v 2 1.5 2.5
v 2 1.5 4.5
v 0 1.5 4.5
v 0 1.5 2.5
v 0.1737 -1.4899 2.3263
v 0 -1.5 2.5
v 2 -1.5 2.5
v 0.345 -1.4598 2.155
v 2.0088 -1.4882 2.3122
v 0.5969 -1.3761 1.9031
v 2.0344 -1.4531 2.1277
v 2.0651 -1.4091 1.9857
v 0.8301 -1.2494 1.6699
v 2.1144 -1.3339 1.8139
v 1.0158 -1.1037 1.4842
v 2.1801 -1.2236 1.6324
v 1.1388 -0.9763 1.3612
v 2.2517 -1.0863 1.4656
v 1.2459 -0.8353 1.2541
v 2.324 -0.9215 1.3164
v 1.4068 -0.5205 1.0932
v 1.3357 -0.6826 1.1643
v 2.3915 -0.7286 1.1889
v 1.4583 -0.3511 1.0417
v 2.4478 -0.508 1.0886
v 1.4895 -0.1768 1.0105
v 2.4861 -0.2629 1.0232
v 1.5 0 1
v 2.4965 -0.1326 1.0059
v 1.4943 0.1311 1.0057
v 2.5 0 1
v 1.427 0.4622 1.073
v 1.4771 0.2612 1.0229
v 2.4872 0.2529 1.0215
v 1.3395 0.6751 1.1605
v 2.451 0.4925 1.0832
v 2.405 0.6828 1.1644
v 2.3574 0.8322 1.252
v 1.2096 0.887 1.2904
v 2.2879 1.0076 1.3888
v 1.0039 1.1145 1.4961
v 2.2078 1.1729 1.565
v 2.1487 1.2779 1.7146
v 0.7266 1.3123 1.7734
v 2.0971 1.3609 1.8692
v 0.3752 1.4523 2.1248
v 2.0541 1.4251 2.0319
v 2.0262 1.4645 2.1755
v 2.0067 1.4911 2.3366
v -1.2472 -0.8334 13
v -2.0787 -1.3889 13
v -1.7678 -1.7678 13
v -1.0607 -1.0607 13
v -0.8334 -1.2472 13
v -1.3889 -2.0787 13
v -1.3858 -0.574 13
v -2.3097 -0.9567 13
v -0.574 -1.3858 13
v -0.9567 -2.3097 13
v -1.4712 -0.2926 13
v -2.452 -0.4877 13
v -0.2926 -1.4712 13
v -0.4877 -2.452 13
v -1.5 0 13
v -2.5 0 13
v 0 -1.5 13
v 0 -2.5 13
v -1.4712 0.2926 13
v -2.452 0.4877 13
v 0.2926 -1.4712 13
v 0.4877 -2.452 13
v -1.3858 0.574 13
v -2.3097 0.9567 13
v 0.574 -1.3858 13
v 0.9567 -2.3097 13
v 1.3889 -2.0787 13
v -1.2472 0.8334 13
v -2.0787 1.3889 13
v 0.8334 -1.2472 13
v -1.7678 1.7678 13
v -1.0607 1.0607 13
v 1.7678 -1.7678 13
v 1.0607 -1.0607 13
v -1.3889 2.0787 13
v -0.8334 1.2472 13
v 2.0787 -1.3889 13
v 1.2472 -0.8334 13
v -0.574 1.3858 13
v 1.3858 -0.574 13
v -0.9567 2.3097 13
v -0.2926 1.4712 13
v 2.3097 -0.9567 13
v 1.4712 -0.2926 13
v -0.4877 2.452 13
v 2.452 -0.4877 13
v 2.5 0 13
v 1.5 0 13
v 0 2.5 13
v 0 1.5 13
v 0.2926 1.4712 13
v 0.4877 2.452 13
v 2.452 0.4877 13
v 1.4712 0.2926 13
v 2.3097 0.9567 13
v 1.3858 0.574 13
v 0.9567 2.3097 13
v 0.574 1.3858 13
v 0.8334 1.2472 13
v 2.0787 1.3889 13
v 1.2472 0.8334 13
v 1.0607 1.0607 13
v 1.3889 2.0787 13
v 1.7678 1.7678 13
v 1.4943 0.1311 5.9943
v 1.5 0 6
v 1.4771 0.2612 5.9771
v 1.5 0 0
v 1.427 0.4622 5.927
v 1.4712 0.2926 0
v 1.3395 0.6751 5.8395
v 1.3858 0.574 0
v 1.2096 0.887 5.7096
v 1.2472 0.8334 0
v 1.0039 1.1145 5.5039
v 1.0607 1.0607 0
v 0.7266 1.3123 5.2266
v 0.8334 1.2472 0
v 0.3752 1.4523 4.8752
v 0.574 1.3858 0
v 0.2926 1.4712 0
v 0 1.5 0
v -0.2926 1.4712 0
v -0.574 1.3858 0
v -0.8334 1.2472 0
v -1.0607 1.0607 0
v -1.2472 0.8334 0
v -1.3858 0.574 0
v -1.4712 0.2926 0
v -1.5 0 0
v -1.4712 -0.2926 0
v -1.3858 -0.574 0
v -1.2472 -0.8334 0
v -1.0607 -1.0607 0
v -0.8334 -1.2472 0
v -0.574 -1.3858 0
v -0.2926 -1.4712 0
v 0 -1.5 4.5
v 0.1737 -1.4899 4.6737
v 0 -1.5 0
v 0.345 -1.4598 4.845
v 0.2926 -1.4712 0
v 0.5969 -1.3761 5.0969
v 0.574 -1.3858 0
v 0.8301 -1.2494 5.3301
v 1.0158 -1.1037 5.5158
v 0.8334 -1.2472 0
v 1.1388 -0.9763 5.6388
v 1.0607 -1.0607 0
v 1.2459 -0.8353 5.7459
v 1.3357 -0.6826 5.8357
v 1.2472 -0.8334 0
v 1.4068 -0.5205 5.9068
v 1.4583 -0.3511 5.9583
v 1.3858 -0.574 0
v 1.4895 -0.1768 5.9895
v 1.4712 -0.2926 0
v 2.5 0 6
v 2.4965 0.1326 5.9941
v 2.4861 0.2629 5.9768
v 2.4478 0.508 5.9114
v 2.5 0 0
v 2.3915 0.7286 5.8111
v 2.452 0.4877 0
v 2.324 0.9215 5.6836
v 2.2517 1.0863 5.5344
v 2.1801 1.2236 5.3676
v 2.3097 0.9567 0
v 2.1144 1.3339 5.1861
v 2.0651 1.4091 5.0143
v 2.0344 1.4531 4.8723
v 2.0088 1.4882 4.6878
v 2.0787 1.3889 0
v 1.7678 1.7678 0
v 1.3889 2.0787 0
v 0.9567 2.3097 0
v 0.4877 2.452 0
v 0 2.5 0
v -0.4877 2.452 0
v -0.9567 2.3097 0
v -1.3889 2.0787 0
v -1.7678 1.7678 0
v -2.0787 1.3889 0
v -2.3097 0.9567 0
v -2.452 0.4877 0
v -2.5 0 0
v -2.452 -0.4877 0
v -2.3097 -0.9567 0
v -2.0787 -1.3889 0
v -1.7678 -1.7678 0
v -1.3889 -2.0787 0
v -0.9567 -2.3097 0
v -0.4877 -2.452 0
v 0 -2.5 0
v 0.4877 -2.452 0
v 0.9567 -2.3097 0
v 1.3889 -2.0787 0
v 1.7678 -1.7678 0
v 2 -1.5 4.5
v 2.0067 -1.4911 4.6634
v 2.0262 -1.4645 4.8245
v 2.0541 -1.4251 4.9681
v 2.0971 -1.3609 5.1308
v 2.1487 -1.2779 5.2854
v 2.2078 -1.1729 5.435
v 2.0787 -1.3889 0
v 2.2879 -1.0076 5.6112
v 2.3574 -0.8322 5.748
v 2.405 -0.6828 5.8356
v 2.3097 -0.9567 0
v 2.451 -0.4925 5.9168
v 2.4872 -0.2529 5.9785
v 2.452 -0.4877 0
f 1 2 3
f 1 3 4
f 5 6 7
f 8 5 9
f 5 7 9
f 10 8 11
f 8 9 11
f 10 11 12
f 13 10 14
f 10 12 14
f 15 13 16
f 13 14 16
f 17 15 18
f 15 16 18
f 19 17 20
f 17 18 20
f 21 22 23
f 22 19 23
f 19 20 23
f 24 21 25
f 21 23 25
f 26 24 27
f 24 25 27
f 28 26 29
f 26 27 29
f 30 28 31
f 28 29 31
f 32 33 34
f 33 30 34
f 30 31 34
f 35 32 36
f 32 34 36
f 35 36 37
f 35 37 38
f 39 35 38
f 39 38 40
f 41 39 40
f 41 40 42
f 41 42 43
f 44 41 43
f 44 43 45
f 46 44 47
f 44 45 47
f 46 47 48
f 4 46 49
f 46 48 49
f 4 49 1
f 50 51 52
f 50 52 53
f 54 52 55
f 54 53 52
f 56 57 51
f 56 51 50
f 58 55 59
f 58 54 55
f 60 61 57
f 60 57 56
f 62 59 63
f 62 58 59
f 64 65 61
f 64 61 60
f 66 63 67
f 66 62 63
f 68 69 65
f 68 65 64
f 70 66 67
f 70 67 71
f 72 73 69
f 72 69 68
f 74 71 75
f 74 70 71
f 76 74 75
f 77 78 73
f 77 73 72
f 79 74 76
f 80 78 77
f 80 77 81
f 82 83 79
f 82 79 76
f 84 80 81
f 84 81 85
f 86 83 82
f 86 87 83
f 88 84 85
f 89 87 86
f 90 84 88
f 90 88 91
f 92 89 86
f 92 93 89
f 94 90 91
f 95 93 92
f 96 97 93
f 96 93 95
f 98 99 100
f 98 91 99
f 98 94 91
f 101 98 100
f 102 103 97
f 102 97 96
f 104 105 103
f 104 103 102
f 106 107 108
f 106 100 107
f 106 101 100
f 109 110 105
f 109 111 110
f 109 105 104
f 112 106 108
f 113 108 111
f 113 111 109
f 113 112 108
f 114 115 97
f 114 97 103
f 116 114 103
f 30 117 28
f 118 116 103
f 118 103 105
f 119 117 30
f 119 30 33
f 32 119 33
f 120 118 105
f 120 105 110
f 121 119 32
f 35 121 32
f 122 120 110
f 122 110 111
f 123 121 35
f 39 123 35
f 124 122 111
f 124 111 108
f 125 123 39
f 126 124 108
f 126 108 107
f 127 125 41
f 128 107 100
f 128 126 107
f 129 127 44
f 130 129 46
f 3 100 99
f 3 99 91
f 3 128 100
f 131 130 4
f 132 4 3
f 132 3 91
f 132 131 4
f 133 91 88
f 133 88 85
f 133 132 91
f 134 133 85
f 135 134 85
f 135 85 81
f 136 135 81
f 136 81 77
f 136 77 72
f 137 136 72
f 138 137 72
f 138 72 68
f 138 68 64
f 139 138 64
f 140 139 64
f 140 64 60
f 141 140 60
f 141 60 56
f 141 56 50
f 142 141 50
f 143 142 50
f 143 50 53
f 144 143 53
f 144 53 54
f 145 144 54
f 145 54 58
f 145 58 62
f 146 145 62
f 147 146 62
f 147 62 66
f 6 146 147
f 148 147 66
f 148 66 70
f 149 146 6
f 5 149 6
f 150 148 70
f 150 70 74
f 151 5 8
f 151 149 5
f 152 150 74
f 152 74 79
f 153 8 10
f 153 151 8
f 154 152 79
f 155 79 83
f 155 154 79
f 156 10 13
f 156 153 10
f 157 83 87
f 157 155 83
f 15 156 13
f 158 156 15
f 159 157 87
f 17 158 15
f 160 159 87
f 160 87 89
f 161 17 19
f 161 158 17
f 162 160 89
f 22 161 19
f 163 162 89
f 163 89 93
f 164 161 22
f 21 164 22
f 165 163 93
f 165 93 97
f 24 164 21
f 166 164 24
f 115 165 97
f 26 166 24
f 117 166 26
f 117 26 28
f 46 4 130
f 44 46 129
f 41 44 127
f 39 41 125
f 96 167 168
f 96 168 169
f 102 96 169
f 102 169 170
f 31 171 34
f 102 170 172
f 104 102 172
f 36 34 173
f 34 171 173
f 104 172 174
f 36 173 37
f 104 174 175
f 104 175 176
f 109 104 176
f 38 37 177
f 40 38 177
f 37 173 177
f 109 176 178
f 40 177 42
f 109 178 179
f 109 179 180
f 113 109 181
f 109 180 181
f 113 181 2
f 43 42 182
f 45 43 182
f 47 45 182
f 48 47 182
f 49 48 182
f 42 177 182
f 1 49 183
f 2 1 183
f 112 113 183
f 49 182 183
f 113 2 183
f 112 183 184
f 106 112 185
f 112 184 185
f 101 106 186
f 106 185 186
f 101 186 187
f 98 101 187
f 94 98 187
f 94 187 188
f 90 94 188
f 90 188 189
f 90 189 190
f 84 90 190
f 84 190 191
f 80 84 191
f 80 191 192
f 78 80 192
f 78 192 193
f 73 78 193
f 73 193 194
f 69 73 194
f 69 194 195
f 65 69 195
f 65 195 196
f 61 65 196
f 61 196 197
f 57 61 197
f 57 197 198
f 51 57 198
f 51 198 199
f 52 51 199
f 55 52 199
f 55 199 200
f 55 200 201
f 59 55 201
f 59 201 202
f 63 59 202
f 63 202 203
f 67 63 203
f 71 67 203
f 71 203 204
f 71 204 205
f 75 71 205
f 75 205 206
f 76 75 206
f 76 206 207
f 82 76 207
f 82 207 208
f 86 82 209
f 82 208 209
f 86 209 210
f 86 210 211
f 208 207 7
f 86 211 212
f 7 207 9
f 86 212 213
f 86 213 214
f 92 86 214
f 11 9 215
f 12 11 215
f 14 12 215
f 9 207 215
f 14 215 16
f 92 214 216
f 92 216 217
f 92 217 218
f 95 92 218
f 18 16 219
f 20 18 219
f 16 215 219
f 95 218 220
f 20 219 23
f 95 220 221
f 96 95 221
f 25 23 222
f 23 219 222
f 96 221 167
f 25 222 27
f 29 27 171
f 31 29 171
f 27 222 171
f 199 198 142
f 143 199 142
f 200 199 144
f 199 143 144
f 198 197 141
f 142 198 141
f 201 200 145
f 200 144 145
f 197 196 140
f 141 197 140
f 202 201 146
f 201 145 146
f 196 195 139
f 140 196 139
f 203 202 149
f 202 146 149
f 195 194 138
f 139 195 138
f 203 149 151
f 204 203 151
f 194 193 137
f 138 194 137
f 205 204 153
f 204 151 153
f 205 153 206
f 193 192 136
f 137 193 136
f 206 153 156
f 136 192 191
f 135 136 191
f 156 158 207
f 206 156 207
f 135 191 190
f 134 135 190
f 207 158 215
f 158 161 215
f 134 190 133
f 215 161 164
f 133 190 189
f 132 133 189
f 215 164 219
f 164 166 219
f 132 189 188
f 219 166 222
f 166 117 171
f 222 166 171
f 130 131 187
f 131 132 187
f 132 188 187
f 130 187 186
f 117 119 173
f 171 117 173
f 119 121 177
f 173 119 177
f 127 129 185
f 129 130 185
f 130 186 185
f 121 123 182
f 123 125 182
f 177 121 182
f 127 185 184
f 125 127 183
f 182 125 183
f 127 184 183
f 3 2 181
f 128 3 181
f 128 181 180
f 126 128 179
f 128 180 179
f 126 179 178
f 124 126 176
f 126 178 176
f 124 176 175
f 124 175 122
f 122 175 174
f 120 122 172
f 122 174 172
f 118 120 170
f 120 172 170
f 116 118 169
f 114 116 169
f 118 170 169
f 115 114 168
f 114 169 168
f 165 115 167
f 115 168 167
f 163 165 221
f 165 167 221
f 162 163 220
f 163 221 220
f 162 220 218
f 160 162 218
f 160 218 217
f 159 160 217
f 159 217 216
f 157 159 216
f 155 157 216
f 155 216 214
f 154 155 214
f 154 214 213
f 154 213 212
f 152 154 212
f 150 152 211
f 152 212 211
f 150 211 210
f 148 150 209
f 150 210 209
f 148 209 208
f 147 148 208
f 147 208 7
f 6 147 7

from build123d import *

# Parameters (mm, degrees)
SKETCH_R     = 2.5
SKETCH_R_2   = 1.5
PAD_DEPTH    = 13
POCKET_DEPTH = 2.5


with BuildPart() as part:
    # Sketch → Pad (new body)
    with BuildSketch(Plane.XY):
        Circle(SKETCH_R)
        Circle(SKETCH_R_2, mode=Mode.SUBTRACT)
    extrude(amount=PAD_DEPTH)

    # Sketch001 (on DatumPlane) → Pocket (cut)
    with BuildSketch(Plane.YZ.offset(2.5)):
        with BuildLine():
            ThreePointArc((1.5, 4.5), (0, 6), (-1.5, 4.5))
            Line((-1.5, 4.5), (-1.5, 2.5))
            ThreePointArc((-1.5, 2.5), (0, 1), (1.5, 2.5))
            Line((1.5, 4.5), (1.5, 2.5))
        make_face()
    extrude(amount=-POCKET_DEPTH, mode=Mode.SUBTRACT)


solid = part.part
